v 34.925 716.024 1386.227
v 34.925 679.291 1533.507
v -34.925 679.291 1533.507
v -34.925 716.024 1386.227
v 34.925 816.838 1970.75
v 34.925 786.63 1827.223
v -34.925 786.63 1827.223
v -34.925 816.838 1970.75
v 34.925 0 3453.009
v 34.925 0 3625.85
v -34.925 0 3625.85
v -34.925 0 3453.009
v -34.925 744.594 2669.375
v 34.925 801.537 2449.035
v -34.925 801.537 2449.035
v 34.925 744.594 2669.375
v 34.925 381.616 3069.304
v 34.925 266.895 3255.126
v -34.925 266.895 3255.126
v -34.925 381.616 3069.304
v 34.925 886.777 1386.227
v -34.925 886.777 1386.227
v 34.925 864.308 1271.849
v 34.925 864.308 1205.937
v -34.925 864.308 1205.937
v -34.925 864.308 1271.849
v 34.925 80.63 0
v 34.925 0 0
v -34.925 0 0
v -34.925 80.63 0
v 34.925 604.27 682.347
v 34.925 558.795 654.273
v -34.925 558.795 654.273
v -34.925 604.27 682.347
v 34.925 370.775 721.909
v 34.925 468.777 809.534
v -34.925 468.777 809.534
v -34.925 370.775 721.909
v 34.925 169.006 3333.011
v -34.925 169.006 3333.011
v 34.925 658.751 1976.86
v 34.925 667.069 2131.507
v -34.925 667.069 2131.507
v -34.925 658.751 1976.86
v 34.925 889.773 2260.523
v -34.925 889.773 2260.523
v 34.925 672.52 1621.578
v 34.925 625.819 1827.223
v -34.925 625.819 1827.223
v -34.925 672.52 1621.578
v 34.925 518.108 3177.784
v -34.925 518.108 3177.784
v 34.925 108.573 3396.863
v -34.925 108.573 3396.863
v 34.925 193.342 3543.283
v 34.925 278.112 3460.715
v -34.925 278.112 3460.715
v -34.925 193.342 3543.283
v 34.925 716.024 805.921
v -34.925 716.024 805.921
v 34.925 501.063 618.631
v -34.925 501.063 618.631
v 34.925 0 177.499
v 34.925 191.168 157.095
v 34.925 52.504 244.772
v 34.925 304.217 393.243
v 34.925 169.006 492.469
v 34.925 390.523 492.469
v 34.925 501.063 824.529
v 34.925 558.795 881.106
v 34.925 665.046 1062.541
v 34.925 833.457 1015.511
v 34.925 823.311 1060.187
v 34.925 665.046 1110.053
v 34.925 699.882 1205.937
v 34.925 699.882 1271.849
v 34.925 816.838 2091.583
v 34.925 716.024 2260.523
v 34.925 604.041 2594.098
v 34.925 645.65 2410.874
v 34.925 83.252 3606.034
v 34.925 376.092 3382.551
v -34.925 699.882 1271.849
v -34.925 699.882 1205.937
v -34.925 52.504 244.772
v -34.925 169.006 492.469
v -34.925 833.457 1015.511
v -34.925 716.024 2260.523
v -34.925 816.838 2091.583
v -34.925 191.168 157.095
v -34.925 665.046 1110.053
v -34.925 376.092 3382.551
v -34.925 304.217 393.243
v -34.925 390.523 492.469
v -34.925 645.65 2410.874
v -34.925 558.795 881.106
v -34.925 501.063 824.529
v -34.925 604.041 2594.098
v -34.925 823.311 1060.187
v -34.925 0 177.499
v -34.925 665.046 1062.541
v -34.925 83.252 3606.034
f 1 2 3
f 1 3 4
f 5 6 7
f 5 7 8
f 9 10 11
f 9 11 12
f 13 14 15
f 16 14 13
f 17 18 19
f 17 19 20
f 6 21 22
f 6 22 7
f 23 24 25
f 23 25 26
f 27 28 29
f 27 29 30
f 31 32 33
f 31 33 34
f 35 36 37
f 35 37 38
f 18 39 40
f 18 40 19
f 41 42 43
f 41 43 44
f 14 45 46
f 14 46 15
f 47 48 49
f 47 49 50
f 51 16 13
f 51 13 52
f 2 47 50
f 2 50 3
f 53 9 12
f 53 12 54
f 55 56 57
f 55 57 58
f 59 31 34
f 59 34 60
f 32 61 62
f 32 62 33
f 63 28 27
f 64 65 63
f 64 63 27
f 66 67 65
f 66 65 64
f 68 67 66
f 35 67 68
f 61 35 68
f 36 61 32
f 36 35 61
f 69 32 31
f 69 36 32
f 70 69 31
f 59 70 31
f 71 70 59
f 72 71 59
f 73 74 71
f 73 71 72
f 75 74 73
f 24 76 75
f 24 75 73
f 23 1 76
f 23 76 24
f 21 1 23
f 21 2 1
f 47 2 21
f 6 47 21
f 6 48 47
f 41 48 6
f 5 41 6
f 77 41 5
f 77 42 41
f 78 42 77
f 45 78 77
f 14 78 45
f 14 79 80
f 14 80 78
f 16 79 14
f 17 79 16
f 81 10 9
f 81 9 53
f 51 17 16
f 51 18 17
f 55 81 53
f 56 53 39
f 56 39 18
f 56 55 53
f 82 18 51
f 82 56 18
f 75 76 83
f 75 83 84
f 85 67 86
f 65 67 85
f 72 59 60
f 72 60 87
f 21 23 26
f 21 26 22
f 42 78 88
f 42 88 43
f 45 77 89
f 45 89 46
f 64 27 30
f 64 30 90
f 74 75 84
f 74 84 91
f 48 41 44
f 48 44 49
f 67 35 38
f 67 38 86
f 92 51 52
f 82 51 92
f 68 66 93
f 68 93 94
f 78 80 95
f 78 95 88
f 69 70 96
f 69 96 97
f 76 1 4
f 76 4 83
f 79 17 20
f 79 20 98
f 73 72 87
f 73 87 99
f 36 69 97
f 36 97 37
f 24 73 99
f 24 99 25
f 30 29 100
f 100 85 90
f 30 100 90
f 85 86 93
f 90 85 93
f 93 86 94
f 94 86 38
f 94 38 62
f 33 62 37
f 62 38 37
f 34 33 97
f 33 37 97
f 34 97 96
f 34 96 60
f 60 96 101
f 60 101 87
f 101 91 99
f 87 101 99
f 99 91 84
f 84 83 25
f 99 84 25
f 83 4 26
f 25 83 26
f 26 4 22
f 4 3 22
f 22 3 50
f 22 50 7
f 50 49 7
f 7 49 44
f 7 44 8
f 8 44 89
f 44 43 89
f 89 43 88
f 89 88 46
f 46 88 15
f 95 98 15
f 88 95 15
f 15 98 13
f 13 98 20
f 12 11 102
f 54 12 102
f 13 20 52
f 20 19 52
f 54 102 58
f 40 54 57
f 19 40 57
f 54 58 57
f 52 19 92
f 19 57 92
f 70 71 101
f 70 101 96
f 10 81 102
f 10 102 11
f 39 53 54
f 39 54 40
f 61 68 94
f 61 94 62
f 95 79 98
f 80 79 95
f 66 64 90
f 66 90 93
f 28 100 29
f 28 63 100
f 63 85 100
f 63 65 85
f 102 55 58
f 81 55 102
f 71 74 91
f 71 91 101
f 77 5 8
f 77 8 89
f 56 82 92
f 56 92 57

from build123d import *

# Parameters (mm, degrees)
F1_DEPTH = 34.925


with BuildPart() as f1:
    # F0 (on Right) → F1 (new body, symmetric)
    with BuildSketch(Plane.YZ):
        Polygon((0, 177.4987136489), (0, 0), (80.6301941103, 0), (191.1676356724, 157.0948170049), (304.2172897297, 393.2430137401), (390.5227723901, 492.4687444506), (501.0633099215, 618.6311770084), (558.7948598303, 654.2727615103), (604.2697327295, 682.3474715729), (716.0237356889, 805.9208712282), (833.4570987513, 1015.5113461059), (823.3114671834, 1060.1874147418), (864.3083995663, 1205.9371897181), (864.3083995663, 1271.8494015263), (886.7773433951, 1386.2265840571), (853.3309235748, 1533.5071685645), (830.8663102107, 1632.4296064454), (786.6300745783, 1827.2229109414), (816.8383120736, 1970.7500793789), (816.8383120736, 2091.5830293601), (889.7727520262, 2260.522764281), (801.5373263826, 2449.0352850475), (744.5941329498, 2669.3751048716), (518.1075050627, 3177.7840826502), (376.0915174209, 3382.5513601832), (278.1115545457, 3460.7151486208), (193.3423488693, 3543.2825743104), (83.2524511698, 3606.0336323661), (0, 3625.85), (0, 3453.0089379868), (108.5731335332, 3396.8630266951), (169.0060591815, 3333.0109047694), (266.8950652787, 3255.1262462236), (381.6159083639, 3069.3036412327), (604.0412207552, 2594.0981779468), (645.6502368782, 2410.8737775981), (716.0237356889, 2260.522764281), (667.0690511998, 2131.5069499635), (658.7513359053, 1976.8604892749), (625.8193408889, 1827.2229109414), (672.5198892169, 1621.5780589203), (679.2911847261, 1533.5071685645), (716.0237356889, 1386.2265840571), (699.8821919046, 1271.8494015263), (699.8821919046, 1205.9371897181), (665.0457458767, 1110.0532898606), (665.0457458767, 1062.5407764791), (558.7948598303, 881.1061922545), (501.0633099215, 824.5292988458), (468.7769380172, 809.5341041243), (370.7749121342, 721.908724241), (169.0060591815, 492.4687444506), (52.50437515, 244.7721280309), align=None)
    extrude(amount=F1_DEPTH, both=True)


solid = f1.part
